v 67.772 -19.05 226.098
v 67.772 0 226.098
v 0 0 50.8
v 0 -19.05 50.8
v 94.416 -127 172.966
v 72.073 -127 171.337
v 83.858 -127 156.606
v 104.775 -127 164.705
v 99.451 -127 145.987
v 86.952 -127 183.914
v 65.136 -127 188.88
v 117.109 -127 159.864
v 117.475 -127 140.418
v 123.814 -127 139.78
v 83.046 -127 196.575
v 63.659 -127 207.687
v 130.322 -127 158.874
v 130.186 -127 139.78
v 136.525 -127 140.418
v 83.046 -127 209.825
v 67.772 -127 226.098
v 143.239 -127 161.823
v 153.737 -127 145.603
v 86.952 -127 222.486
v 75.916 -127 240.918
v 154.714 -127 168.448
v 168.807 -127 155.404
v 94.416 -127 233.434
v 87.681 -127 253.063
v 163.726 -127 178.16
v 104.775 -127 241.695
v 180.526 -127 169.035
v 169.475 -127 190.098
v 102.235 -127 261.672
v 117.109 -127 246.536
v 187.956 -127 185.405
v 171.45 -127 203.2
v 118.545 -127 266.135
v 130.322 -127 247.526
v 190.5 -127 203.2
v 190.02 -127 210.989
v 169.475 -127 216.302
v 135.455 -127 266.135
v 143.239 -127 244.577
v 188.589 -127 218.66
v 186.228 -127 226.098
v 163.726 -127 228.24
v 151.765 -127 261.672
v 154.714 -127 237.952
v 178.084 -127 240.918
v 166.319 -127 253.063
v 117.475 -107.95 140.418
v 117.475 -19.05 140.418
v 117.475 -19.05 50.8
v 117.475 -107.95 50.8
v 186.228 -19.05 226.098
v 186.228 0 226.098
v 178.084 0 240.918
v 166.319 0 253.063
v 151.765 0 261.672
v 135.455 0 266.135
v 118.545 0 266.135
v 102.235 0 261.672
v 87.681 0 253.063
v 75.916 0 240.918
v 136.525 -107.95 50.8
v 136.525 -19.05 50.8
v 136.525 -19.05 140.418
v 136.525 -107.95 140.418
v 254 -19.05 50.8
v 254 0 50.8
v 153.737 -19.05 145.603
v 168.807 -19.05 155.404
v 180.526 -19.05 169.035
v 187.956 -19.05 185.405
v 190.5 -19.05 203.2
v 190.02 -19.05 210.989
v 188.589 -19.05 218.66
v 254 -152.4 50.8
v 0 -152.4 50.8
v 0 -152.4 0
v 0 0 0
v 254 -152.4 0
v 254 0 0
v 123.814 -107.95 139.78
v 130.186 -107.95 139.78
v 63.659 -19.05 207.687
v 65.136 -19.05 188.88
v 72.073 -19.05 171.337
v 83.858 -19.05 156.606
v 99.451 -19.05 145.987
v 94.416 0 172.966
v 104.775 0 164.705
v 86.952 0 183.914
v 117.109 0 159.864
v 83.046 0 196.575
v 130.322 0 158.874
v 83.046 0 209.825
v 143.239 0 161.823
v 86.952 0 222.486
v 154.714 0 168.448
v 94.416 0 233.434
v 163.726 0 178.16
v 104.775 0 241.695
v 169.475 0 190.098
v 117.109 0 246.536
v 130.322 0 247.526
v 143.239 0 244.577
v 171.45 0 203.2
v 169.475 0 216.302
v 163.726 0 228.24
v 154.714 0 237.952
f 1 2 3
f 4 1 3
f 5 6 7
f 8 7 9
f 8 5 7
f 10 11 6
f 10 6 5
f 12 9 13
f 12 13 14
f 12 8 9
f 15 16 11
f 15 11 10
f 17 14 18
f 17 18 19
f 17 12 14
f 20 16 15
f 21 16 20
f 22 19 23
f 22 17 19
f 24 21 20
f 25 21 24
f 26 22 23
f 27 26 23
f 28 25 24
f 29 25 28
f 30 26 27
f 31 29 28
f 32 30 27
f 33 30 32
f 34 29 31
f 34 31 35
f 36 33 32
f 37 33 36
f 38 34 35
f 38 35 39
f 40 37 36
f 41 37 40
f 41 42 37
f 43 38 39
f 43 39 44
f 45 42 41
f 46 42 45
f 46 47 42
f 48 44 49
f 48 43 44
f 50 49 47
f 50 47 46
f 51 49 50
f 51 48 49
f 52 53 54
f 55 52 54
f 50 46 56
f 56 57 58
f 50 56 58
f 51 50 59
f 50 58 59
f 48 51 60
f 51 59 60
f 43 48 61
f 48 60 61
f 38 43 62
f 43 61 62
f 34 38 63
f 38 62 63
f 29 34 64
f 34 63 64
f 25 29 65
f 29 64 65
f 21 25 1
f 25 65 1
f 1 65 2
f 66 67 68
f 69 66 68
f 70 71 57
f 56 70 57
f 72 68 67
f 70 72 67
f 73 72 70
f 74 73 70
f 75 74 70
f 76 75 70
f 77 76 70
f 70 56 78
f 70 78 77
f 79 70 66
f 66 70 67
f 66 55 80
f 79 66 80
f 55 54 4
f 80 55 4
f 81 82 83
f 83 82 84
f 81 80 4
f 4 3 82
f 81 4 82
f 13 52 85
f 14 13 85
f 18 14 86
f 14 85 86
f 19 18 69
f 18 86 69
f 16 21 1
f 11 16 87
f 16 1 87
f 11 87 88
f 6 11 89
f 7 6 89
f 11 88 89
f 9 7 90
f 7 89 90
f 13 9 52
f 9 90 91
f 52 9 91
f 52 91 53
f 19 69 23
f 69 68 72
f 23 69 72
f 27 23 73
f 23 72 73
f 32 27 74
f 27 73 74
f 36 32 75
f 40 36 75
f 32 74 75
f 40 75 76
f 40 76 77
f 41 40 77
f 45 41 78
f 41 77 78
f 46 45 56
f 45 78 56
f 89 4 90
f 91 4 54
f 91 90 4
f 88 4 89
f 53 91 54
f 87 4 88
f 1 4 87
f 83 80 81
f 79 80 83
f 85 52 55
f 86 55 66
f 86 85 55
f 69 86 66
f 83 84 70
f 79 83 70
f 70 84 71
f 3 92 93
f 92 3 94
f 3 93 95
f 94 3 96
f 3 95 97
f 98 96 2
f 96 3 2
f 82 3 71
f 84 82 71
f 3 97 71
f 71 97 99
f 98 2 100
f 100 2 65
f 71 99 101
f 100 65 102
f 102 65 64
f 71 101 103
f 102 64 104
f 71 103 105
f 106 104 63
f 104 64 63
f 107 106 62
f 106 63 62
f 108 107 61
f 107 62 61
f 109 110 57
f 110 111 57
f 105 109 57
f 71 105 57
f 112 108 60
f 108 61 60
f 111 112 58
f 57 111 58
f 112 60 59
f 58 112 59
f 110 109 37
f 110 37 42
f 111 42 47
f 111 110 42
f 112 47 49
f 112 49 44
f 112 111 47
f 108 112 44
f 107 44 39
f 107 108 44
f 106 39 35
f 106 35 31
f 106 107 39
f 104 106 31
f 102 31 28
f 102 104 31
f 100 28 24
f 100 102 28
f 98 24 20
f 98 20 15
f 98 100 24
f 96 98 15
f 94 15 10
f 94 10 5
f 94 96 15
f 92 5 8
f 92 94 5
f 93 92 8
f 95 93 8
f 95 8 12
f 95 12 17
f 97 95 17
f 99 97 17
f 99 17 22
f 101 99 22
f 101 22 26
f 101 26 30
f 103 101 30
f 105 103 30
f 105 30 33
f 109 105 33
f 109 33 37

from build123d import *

# Parameters (mm, degrees)
F0_R     = 44.45
F1_DEPTH = 127
F2_DEPTH = 19.05
F3_DEPTH = 107.95
F4_DEPTH = 152.4
F5_DEPTH = 25.4


with BuildPart() as f1:
    # F0 (on Front) → F1 (new body)
    with BuildSketch(Plane.XZ):
        with BuildLine():
            ThreePointArc((186.227747, 226.098122), (127, 266.7), (67.772253, 226.098122))
            ThreePointArc((67.772253, 226.098122), (72.072893, 171.336809), (117.475, 140.418439))
            ThreePointArc((117.475, 140.418439), (127, 139.7), (136.525, 140.418439))
            ThreePointArc((136.525, 140.418439), (175.151259, 161.803065), (190.5, 203.2))
            ThreePointArc((190.5, 203.2), (189.4228, 214.846632), (186.227747, 226.098122))
        make_face()
        with Locations((127, 203.2)):
            Circle(F0_R, mode=Mode.SUBTRACT)
    extrude(amount=F1_DEPTH)

    # F0 (on Front) → F2 (join)
    with BuildSketch(Plane.XZ):
        with BuildLine():
            Line((136.525, 50.8), (254, 50.8))
            Line((254, 50.8), (186.227747, 226.098122))
            ThreePointArc((186.227747, 226.098122), (189.4228, 214.846632), (190.5, 203.2))
            ThreePointArc((190.5, 203.2), (175.151259, 161.803065), (136.525, 140.418439))
            Line((136.525, 140.418439), (136.525, 50.8))
        make_face()
        with BuildLine():
            Line((67.772253, 226.098122), (0, 50.8))
            Line((0, 50.8), (117.475, 50.8))
            Line((117.475, 50.8), (117.475, 140.418439))
            ThreePointArc((117.475, 140.418439), (72.072893, 171.336809), (67.772253, 226.098122))
        make_face()
    extrude(amount=F2_DEPTH)

    # F0 (on Front) → F3 (join)
    with BuildSketch(Plane.XZ):
        with BuildLine():
            Line((117.475, 140.418439), (117.475, 50.8))
            Line((117.475, 50.8), (136.525, 50.8))
            Line((136.525, 50.8), (136.525, 140.418439))
            ThreePointArc((136.525, 140.418439), (127, 139.7), (117.475, 140.418439))
        make_face()
    extrude(amount=F3_DEPTH)

    # F0 (on Front) → F4 (join)
    with BuildSketch(Plane.XZ):
        Polygon((0, 50.8), (0, 0), (254, 0), (254, 50.8), (136.525, 50.8), (117.475, 50.8), align=None)
    extrude(amount=F4_DEPTH)

    # F0 (on Front) → F5 (join)
    with BuildSketch(Plane.XZ):
        with BuildLine():
            ThreePointArc((186.227747, 226.098122), (127, 266.7), (67.772253, 226.098122))
            ThreePointArc((67.772253, 226.098122), (72.072893, 171.336809), (117.475, 140.418439))
            ThreePointArc((117.475, 140.418439), (127, 139.7), (136.525, 140.418439))
            ThreePointArc((136.525, 140.418439), (175.151259, 161.803065), (190.5, 203.2))
            ThreePointArc((190.5, 203.2), (189.4228, 214.846632), (186.227747, 226.098122))
        make_face()
        with Locations((127, 203.2)):
            Circle(F0_R, mode=Mode.SUBTRACT)
        Polygon((0, 50.8), (0, 0), (254, 0), (254, 50.8), (136.525, 50.8), (117.475, 50.8), align=None)
    extrude(amount=F5_DEPTH)


solid = f1.part
